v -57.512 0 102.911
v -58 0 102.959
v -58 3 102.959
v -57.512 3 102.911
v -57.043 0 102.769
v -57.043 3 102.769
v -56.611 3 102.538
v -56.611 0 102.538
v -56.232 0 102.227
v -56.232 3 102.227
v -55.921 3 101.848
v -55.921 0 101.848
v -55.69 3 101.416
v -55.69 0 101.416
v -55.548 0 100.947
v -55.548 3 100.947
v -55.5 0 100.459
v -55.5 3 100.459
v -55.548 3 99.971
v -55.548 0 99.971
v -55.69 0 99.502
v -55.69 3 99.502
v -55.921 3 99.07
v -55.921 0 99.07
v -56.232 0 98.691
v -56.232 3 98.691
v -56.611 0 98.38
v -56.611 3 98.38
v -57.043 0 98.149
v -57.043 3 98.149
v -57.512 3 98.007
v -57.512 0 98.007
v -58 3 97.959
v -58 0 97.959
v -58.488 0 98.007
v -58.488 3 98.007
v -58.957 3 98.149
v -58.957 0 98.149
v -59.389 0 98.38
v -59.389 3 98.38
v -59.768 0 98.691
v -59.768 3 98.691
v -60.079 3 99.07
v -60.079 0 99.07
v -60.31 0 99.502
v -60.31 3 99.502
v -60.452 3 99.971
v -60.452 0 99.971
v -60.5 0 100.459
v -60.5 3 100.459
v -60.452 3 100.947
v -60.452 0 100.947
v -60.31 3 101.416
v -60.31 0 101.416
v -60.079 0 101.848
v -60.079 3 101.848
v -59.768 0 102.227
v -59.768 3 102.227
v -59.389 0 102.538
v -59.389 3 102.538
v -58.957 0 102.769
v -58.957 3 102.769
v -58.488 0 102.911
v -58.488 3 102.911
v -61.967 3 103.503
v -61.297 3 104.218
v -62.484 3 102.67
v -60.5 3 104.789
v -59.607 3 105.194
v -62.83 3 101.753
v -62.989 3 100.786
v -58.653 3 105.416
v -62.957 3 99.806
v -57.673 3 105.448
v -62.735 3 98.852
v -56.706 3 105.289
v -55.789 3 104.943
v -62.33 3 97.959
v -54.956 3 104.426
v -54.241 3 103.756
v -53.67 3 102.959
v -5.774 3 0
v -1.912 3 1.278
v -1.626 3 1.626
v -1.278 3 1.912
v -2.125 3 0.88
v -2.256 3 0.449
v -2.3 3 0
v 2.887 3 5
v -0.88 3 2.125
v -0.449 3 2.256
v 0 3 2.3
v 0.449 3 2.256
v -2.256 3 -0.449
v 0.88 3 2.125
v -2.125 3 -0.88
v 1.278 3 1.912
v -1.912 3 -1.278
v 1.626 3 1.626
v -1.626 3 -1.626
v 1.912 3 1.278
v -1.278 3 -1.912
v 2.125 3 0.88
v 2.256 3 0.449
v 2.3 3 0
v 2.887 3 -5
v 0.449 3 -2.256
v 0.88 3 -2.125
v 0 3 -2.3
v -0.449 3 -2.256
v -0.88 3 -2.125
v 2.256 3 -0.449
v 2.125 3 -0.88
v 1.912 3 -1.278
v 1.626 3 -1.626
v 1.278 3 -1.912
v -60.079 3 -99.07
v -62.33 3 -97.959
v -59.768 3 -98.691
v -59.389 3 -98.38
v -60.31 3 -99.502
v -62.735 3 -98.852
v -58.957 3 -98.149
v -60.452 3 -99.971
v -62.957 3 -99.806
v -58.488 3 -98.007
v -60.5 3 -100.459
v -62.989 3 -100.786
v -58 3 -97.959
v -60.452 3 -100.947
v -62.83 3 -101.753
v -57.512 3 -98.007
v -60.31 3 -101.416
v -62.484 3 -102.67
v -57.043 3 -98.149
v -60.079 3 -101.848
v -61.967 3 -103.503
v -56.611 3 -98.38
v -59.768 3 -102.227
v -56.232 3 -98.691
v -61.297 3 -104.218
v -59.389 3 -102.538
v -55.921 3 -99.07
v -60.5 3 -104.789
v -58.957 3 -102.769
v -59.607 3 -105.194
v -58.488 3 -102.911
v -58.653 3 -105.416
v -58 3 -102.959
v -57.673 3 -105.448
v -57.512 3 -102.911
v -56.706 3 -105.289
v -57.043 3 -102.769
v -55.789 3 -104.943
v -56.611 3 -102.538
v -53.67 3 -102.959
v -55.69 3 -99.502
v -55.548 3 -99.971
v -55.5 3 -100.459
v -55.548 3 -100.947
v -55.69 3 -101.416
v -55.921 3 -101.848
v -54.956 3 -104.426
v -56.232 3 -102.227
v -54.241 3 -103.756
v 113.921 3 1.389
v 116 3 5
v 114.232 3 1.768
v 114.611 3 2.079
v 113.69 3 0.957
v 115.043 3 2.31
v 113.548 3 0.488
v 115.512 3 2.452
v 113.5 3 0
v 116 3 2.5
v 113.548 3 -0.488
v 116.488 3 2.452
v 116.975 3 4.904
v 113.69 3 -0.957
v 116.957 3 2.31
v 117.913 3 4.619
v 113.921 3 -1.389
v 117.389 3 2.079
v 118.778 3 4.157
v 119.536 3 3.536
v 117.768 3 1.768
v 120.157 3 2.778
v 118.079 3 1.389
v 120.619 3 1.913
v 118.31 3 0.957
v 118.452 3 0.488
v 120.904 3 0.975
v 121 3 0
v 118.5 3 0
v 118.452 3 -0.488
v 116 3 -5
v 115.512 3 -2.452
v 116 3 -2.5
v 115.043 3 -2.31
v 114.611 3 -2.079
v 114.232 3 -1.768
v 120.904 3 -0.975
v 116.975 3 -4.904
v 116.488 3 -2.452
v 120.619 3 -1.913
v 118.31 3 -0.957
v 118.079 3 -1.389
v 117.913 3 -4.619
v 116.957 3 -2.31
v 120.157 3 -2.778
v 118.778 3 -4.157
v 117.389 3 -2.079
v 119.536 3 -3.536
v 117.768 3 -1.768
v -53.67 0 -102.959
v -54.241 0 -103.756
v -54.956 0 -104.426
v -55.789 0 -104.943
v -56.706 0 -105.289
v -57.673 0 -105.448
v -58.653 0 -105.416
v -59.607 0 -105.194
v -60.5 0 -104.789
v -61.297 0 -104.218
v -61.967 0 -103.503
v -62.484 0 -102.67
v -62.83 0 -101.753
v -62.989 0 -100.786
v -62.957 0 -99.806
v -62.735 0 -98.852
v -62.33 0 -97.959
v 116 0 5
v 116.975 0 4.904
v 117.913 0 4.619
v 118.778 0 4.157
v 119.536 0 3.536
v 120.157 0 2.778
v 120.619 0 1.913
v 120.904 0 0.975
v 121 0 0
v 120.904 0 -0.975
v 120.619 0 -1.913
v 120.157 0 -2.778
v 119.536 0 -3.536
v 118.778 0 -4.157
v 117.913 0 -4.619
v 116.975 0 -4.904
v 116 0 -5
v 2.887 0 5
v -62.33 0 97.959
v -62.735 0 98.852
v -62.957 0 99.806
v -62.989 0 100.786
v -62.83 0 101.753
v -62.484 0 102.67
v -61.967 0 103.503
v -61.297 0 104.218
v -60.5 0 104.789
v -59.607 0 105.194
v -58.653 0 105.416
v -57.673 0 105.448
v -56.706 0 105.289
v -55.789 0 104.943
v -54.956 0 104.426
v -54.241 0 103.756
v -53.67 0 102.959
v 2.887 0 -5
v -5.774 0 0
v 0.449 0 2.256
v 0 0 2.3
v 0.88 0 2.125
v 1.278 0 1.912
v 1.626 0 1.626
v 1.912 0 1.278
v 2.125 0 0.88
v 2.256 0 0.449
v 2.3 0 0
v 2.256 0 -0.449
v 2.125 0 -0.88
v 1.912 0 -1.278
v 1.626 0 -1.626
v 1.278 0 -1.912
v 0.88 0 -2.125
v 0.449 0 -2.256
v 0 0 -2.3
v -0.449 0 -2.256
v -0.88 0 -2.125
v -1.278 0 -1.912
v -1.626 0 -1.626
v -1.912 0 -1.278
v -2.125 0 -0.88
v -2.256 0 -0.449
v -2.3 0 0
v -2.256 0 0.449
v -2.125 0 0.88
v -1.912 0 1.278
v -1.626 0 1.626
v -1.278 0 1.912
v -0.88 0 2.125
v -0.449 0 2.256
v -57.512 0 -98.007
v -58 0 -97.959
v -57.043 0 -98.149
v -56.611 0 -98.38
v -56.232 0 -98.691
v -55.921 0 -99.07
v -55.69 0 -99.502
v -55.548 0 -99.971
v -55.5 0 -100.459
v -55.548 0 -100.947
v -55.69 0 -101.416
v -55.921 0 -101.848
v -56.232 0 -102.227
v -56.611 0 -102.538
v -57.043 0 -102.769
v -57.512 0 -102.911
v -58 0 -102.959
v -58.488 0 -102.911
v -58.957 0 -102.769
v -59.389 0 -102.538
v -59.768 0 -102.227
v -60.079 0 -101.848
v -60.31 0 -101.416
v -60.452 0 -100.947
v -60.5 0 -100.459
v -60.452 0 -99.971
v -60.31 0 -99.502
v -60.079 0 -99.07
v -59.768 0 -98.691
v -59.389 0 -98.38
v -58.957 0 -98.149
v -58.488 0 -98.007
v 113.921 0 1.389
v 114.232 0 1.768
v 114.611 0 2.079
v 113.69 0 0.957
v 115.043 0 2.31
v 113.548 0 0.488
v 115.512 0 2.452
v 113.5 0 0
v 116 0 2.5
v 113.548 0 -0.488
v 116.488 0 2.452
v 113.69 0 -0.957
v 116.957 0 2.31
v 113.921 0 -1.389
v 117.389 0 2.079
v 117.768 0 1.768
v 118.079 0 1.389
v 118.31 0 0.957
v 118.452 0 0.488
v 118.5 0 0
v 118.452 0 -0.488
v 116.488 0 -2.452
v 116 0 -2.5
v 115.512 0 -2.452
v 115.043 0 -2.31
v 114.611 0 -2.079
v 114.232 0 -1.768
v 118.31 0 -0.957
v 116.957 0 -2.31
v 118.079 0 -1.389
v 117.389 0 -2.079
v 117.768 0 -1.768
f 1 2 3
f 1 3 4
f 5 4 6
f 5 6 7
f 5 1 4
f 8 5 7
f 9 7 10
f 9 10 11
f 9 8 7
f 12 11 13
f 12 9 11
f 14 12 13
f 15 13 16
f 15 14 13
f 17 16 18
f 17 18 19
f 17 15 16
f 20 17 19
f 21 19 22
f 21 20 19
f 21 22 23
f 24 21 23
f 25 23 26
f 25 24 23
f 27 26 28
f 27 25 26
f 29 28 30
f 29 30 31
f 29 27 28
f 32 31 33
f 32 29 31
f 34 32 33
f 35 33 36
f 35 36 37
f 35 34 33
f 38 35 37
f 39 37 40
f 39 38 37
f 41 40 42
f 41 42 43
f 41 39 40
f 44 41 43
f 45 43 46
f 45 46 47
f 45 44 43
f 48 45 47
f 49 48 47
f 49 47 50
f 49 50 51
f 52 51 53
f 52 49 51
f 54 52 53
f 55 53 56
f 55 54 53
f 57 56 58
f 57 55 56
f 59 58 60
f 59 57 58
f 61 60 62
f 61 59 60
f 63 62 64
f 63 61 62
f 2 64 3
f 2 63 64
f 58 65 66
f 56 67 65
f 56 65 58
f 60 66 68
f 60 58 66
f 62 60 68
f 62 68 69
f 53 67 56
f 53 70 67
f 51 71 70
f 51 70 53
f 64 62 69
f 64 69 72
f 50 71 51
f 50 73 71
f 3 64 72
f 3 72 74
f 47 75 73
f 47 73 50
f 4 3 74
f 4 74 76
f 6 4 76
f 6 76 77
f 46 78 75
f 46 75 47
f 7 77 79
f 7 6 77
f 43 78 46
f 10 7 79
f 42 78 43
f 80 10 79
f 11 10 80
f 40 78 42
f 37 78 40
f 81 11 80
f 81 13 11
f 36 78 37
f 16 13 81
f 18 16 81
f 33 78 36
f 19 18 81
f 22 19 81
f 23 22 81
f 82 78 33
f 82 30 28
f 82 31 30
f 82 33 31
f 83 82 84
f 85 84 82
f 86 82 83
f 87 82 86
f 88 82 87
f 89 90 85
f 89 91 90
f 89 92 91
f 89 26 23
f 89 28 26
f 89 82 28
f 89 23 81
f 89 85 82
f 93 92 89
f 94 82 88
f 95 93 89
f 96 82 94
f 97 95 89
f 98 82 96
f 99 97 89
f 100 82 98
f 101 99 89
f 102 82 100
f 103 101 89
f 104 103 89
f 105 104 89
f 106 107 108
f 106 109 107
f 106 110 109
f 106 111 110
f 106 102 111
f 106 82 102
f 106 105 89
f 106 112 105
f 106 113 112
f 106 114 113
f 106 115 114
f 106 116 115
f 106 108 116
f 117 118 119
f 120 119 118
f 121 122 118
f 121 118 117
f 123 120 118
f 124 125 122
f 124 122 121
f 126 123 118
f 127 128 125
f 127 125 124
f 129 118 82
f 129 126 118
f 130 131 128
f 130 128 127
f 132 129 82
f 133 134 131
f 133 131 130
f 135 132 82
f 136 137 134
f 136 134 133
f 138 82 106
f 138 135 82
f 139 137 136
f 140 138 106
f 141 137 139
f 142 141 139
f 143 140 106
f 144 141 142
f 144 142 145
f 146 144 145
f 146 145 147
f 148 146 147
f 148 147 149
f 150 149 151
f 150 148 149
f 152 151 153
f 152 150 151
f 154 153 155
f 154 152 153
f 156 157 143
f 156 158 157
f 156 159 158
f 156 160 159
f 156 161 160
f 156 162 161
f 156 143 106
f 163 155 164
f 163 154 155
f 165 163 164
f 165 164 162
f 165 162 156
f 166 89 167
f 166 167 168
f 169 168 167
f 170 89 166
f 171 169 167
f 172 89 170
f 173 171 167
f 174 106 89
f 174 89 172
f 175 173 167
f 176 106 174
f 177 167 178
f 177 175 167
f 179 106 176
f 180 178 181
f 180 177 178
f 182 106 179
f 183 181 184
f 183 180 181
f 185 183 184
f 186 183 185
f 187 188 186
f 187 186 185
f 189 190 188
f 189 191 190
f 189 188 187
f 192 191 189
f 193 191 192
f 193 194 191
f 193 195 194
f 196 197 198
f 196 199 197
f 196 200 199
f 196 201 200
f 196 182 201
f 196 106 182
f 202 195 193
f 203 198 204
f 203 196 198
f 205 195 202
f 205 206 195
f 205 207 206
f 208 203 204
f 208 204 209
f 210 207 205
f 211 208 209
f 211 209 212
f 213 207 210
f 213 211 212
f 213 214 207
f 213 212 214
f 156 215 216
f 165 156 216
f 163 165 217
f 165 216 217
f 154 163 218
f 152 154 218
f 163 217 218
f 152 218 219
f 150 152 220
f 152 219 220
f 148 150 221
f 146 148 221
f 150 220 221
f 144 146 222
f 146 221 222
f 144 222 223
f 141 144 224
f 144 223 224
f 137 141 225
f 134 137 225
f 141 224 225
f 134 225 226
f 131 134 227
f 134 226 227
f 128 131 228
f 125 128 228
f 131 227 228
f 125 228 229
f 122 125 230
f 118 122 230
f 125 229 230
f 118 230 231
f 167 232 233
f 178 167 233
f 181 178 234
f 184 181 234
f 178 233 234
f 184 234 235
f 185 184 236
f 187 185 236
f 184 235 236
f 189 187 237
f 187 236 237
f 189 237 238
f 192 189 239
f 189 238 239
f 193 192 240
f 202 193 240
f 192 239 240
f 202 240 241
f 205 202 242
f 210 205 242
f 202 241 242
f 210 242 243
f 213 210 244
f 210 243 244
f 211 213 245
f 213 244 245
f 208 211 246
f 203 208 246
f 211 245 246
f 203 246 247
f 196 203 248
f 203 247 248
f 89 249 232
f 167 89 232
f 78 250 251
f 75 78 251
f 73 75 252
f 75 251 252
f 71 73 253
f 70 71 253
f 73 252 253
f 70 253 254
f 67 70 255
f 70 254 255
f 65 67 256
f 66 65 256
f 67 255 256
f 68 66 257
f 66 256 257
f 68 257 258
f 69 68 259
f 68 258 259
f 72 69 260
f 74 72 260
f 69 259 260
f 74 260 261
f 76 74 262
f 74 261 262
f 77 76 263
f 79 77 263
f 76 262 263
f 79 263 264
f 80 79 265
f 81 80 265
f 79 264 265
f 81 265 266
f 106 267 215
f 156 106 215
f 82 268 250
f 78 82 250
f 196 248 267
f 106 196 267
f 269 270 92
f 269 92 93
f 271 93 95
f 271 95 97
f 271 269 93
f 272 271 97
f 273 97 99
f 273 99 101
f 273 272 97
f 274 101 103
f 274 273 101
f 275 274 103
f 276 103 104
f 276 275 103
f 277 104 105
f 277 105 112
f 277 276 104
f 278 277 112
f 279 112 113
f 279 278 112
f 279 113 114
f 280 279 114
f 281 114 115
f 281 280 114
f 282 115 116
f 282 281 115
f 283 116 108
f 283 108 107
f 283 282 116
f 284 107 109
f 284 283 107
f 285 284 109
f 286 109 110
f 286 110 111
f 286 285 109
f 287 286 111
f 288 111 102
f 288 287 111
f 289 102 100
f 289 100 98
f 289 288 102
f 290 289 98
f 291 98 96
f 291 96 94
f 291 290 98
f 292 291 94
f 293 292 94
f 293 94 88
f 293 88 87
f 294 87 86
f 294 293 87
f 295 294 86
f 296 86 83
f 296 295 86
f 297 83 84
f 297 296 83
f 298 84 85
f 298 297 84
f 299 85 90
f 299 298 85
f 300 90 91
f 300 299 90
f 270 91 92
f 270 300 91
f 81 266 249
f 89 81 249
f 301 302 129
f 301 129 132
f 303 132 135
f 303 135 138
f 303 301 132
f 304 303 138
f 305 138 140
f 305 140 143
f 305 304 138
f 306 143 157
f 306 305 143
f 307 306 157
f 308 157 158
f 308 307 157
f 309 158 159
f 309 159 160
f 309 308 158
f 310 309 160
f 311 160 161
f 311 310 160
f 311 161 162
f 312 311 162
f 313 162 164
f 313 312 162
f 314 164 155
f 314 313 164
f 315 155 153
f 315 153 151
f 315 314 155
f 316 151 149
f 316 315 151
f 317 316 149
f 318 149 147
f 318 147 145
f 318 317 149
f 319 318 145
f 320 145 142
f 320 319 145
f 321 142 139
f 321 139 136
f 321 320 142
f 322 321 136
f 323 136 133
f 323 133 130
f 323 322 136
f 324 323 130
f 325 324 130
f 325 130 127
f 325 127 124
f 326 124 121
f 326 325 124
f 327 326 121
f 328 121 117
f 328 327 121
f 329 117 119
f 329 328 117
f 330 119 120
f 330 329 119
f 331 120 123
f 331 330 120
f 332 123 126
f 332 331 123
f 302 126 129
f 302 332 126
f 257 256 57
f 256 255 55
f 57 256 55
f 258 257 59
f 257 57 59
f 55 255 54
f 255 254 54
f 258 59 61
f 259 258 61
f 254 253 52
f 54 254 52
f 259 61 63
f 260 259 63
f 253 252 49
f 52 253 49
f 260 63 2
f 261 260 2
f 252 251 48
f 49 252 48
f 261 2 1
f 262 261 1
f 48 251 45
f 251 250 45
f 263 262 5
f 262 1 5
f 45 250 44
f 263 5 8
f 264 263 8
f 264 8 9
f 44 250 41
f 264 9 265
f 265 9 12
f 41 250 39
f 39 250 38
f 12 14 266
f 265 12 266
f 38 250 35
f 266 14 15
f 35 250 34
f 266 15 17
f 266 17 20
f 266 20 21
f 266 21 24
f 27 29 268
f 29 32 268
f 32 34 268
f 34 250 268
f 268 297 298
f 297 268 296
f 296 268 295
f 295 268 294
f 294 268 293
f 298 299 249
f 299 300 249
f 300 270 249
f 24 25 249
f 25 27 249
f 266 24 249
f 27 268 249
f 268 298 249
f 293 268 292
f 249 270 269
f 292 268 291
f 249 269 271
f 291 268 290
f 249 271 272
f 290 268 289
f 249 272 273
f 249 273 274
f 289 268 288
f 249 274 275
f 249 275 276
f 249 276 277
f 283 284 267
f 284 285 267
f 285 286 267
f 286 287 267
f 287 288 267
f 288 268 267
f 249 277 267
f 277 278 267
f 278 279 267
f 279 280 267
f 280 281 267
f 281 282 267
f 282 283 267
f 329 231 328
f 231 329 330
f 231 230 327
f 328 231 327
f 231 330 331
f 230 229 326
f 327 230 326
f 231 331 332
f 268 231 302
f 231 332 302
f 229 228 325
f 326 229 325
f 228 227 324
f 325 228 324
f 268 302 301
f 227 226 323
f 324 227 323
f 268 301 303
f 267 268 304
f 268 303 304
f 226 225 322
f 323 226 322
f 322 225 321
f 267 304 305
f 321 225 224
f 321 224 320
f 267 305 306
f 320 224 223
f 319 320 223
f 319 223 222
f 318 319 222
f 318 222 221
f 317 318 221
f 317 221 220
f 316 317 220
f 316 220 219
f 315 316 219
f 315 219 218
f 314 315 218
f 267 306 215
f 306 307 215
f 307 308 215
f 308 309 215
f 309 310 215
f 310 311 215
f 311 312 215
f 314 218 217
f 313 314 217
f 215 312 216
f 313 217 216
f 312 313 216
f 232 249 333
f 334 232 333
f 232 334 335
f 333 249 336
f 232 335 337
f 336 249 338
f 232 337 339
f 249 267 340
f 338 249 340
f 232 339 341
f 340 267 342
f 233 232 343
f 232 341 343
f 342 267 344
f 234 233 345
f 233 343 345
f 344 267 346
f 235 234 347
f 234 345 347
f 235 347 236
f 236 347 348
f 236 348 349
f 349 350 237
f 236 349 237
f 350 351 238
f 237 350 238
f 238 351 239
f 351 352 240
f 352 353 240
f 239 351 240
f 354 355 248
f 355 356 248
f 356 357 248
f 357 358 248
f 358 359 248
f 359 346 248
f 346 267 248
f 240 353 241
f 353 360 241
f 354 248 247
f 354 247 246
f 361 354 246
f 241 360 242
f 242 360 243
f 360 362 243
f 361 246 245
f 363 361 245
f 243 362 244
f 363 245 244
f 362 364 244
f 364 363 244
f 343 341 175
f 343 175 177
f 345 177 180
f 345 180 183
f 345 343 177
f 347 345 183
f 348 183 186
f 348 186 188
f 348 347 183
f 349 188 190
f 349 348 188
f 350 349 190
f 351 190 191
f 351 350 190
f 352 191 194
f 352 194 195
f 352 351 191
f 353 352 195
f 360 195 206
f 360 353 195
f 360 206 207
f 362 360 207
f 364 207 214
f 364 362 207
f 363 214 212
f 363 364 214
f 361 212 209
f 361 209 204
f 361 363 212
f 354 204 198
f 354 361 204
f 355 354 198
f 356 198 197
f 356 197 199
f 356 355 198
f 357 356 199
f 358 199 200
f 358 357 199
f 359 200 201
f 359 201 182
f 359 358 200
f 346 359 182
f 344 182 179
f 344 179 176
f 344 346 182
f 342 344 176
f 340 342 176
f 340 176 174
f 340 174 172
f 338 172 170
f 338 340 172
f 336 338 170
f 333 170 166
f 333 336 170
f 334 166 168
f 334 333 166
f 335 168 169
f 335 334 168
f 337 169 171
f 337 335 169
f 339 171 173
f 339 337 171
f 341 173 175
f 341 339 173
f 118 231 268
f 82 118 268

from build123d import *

# Parameters (mm, degrees)
SKETCH8_R           = 2.5
SKETCH8_R_2         = 2.3
BOSS_EXTRUDE5_DEPTH = 3


with BuildPart() as part:
    # Sketch8 → Boss-Extrude5 (new body)
    # profile 1 of 7: a face of its own
    with BuildSketch(Plane(origin=(0, 0, 0), x_dir=(1, 0, 0), z_dir=(0, 1, 0))):
        with BuildLine():
            ThreePointArc((-4.330127019, 2.5), (-2.5, 4.330127019), (0, 5))
            Line((0, 5), (2.886751346, 5))
            Line((2.886751346, 5), (-53.669872981, 102.958946839))
            ThreePointArc((-53.669872981, 102.958946839), (-60.5, 104.789073858), (-62.330127019, 97.958946839))
            Line((-62.330127019, 97.958946839), (-5.773502692, 0))
            Line((-5.773502692, 0), (-4.330127019, 2.5))
        make_face()
        with Locations(Location((-58, 100.458946839, 0), (0, 0, 270))):
            Circle(SKETCH8_R, mode=Mode.SUBTRACT)
    # profile 2 of 7: a face of its own
    with BuildSketch(Plane(origin=(0, 0, 0), x_dir=(1, 0, 0), z_dir=(0, 1, 0))):
        with BuildLine():
            Line((116, 5), (2.886751346, 5))
            Line((2.886751346, 5), (4.330127019, 2.5))
            ThreePointArc((4.330127019, 2.5), (5, 0), (4.330127019, -2.5))
            Line((4.330127019, -2.5), (2.886751346, -5))
            Line((2.886751346, -5), (116, -5))
            ThreePointArc((116, -5), (121, 0), (116, 5))
        make_face()
        with Locations(Location((116, 0, 0), (0, 0, 270))):
            Circle(SKETCH8_R, mode=Mode.SUBTRACT)
    # profile 3 of 7: a face of its own
    with BuildSketch(Plane(origin=(0, 0, 0), x_dir=(1, 0, 0), z_dir=(0, 1, 0))):
        with BuildLine():
            Line((-4.330127019, -2.5), (-5.773502692, 0))
            Line((-5.773502692, 0), (-62.330127019, -97.958946839))
            ThreePointArc((-62.330127019, -97.958946839), (-60.5, -104.789073858), (-53.669872981, -102.958946839))
            Line((-53.669872981, -102.958946839), (2.886751346, -5))
            Line((2.886751346, -5), (0, -5))
            ThreePointArc((0, -5), (-2.5, -4.330127019), (-4.330127019, -2.5))
        make_face()
        with Locations(Location((-58, -100.458946839, 0), (0, 0, 270))):
            Circle(SKETCH8_R, mode=Mode.SUBTRACT)
    # profile 4 of 7: a face of its own
    with BuildSketch(Plane(origin=(0, 0, 0), x_dir=(1, 0, 0), z_dir=(0, 1, 0))):
        with BuildLine():
            ThreePointArc((4.330127019, 2.5), (2.5, 4.330127019), (0, 5))
            ThreePointArc((0, 5), (-2.5, 4.330127019), (-4.330127019, 2.5))
            ThreePointArc((-4.330127019, 2.5), (-5, 0), (-4.330127019, -2.5))
            ThreePointArc((-4.330127019, -2.5), (-2.5, -4.330127019), (0, -5))
            ThreePointArc((0, -5), (2.5, -4.330127019), (4.330127019, -2.5))
            ThreePointArc((4.330127019, -2.5), (5, 0), (4.330127019, 2.5))
        make_face()
        with Locations(Location((0, 0, 0), (0, 0, 270))):
            Circle(SKETCH8_R_2, mode=Mode.SUBTRACT)
    # profile 5 of 7: a face of its own
    with BuildSketch(Plane(origin=(0, 0, 0), x_dir=(1, 0, 0), z_dir=(0, 1, 0))):
        with BuildLine():
            Line((2.886751346, 5), (0, 5))
            ThreePointArc((0, 5), (2.5, 4.330127019), (4.330127019, 2.5))
            Line((4.330127019, 2.5), (2.886751346, 5))
        make_face()
    # profile 6 of 7: a face of its own
    with BuildSketch(Plane(origin=(0, 0, 0), x_dir=(1, 0, 0), z_dir=(0, 1, 0))):
        with BuildLine():
            ThreePointArc((-4.330127019, -2.5), (-5, 0), (-4.330127019, 2.5))
            Line((-4.330127019, 2.5), (-5.773502692, 0))
            Line((-5.773502692, 0), (-4.330127019, -2.5))
        make_face()
    # profile 7 of 7: a face of its own
    with BuildSketch(Plane(origin=(0, 0, 0), x_dir=(1, 0, 0), z_dir=(0, 1, 0))):
        with BuildLine():
            Line((2.886751346, -5), (4.330127019, -2.5))
            ThreePointArc((4.330127019, -2.5), (2.5, -4.330127019), (0, -5))
            Line((0, -5), (2.886751346, -5))
        make_face()
    extrude(amount=BOSS_EXTRUDE5_DEPTH)


solid = part.part
